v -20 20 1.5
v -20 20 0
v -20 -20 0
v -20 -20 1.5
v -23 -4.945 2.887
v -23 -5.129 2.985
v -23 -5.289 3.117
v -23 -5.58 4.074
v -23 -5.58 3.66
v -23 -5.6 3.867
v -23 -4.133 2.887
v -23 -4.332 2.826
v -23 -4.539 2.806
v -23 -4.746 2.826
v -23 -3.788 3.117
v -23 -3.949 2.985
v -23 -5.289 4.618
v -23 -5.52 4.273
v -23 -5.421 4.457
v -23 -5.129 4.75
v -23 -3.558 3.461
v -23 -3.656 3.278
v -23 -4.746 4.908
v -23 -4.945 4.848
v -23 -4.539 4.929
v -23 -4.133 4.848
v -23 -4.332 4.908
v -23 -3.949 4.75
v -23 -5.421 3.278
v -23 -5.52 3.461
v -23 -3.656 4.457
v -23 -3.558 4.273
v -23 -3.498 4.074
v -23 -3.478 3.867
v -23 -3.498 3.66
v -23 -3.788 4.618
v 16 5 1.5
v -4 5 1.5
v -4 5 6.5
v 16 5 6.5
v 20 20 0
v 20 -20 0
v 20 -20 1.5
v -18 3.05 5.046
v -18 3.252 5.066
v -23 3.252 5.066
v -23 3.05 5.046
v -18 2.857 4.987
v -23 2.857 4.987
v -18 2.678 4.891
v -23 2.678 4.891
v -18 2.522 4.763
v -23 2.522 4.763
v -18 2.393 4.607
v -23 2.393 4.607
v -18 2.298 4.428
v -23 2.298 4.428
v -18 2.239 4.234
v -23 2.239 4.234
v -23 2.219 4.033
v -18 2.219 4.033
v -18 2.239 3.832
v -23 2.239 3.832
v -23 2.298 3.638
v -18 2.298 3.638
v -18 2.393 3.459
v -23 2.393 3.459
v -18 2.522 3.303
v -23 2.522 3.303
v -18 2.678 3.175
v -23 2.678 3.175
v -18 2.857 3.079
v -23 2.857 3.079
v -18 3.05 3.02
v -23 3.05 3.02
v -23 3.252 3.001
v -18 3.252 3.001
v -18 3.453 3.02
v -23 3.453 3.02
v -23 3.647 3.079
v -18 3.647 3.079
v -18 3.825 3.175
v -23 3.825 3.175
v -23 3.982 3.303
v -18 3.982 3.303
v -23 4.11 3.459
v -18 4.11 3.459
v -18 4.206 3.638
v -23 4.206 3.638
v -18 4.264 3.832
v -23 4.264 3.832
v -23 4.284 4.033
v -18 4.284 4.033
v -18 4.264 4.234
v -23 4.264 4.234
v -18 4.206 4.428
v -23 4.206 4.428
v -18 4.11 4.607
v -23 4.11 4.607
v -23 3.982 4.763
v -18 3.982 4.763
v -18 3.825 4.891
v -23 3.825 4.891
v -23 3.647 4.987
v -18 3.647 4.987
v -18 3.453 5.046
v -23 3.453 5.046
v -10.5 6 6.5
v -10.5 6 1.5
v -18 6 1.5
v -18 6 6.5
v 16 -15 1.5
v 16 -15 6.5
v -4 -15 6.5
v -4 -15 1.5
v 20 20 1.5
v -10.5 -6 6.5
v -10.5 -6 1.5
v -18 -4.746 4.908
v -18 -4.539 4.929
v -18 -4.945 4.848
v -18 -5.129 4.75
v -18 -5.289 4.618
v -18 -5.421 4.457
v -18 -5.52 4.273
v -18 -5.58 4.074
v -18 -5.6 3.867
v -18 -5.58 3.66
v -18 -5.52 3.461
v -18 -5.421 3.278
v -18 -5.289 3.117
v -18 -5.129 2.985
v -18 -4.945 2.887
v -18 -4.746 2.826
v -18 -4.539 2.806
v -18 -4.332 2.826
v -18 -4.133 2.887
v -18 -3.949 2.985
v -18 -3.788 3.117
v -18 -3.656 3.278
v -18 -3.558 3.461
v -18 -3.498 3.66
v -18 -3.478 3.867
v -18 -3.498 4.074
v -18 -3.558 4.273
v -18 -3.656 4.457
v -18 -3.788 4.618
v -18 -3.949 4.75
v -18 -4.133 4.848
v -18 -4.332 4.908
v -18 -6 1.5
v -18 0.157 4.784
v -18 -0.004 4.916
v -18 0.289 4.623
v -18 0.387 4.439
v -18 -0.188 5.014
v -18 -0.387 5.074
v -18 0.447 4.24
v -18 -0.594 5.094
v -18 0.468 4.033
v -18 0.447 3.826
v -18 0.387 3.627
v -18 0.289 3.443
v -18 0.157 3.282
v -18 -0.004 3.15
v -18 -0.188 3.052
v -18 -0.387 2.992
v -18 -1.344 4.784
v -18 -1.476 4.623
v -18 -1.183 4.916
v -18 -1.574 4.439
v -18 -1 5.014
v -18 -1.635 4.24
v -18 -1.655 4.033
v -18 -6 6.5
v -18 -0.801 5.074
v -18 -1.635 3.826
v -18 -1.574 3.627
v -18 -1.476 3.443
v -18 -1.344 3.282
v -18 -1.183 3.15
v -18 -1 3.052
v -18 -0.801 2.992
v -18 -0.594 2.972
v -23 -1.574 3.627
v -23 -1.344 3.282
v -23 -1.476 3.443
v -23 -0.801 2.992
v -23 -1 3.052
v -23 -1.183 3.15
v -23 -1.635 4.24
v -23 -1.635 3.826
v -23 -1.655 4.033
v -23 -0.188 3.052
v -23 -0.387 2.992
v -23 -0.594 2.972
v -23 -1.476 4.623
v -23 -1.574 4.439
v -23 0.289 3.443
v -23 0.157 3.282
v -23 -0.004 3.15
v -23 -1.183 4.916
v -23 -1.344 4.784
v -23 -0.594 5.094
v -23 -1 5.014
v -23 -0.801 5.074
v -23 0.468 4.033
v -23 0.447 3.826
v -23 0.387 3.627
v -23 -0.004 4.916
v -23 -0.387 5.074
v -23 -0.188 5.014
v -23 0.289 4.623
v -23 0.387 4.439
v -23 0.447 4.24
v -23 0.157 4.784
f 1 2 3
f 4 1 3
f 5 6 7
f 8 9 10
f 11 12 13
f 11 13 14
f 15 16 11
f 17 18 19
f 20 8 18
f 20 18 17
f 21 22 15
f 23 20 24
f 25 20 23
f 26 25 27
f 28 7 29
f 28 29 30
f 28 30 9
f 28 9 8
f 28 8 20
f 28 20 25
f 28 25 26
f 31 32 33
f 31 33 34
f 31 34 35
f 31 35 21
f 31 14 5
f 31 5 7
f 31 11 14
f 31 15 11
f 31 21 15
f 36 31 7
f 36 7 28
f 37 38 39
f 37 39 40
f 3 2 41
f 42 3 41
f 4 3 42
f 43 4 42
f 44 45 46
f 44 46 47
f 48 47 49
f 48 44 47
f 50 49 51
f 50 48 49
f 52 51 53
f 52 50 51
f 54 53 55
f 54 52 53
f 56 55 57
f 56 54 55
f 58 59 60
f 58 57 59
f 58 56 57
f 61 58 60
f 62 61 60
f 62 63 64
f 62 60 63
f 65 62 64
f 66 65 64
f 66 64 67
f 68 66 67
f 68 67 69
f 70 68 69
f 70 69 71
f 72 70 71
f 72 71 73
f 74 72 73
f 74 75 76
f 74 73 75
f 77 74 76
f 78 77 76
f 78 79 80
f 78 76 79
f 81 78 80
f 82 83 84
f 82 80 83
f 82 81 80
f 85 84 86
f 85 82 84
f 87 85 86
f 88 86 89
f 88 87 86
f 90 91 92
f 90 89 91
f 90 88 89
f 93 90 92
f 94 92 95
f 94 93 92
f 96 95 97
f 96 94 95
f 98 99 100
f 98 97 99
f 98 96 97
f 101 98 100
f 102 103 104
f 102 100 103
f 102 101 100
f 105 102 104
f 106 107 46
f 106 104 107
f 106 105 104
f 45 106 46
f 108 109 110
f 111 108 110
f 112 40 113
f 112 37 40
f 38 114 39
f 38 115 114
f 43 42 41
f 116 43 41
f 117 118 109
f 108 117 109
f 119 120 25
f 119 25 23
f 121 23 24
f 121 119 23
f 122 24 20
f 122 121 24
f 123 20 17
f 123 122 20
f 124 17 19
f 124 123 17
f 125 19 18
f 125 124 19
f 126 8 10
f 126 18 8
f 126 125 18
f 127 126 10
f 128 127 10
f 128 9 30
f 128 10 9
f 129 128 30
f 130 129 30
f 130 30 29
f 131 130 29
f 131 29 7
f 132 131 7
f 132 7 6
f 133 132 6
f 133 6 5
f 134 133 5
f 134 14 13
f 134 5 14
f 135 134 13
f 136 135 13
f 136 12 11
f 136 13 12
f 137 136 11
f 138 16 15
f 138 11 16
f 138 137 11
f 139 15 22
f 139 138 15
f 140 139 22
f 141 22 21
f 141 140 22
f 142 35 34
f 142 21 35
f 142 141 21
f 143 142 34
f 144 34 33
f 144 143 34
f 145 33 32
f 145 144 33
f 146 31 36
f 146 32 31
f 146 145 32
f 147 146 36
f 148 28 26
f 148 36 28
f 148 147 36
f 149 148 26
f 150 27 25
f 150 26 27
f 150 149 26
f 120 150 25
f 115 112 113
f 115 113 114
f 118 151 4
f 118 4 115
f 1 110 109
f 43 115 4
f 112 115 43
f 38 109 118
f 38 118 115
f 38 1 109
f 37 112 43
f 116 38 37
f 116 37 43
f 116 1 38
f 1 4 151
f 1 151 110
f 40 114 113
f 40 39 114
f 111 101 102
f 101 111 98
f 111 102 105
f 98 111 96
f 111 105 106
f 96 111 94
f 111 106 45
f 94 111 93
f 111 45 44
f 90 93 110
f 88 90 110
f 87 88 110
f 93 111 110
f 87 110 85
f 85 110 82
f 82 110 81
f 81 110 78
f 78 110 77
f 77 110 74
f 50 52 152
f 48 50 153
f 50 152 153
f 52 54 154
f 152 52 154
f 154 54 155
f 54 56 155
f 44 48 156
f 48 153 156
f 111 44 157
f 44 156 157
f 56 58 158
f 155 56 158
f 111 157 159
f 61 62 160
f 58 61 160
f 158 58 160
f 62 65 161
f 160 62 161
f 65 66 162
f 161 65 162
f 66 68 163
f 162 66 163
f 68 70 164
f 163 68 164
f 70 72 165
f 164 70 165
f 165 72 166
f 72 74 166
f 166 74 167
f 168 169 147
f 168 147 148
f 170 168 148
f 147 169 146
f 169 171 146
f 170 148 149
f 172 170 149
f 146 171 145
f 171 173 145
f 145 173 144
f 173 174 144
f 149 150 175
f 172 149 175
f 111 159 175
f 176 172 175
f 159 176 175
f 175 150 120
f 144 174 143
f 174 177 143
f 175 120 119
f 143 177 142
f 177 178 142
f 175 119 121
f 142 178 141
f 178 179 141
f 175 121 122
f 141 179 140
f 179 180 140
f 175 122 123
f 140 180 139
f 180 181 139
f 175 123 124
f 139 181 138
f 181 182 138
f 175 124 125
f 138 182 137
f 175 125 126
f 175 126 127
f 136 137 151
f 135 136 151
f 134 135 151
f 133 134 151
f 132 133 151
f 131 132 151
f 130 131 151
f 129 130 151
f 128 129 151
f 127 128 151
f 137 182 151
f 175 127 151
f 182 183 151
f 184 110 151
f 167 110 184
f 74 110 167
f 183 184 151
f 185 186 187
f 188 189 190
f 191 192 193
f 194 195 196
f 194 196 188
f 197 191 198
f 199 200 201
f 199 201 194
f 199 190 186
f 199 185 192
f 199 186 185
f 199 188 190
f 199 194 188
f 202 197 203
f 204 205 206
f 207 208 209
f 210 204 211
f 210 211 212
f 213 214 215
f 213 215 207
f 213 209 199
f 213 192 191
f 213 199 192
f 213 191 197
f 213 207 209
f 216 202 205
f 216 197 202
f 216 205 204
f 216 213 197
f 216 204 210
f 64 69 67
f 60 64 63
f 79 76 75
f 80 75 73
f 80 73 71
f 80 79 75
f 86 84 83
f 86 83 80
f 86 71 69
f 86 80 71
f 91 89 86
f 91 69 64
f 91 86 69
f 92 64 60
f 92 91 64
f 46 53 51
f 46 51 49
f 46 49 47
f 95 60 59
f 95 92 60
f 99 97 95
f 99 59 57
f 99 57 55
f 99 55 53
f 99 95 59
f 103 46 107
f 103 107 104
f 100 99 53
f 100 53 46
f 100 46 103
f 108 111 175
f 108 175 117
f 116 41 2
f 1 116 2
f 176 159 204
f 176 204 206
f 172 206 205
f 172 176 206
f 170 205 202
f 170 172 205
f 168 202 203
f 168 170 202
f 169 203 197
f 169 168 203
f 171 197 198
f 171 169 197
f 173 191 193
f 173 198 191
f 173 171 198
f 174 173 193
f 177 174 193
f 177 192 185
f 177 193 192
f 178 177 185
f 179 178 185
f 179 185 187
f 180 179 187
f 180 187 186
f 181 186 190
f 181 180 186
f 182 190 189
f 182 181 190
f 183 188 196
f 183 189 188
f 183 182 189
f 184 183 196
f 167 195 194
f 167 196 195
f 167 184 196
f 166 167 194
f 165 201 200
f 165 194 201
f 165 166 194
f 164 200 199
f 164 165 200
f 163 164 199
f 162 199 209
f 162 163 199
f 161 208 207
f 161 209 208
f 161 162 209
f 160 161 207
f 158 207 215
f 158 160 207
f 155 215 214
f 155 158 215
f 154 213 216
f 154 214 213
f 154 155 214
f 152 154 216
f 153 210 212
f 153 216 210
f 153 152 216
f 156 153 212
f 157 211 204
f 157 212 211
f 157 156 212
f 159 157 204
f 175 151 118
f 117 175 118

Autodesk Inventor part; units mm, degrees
ref_plane "YZ Plane" through (0, 0, 0) normal (1, 0, 0) x (0, 1, 0)
ref_plane "XZ Plane" through (0, 0, 0) normal (0, 1, 0) x (-1, 0, 0)
ref_plane "XY Plane" through (0, 0, 0) normal (0, 0, 1) x (1, 0, 0)
sketch "Sketch1" plane through (0, 0, 0) normal (0, 0, 1) x (1, 0, 0)
  line L0 (-20, -20) -> (20, -20)
  line L1 (20, -20) -> (20, 20)
  line L2 (20, 20) -> (-20, 20)
  line L3 (-20, 20) -> (-20, -20)
  line L4 (-20, -20) -> (20, 20) construction
  line L5 (20, -20) -> (-20, 20) construction
  point P0 (0, 0)
  dimension "d0" = 40
  dimension "d1" = 40
extrude "Extrusion1" add sketch "Sketch1" along normal blind 1.5
sketch "Sketch2" plane through (0, 0, 1.5) normal (0, 0, 1) x (1, 0, 0)
  line L0 (-28, 0) -> (28, 0) projected
  line L1 (-18, -6) -> (-10.5, -6)
  line L2 (-10.5, -6) -> (-10.5, 6)
  line L3 (-10.5, 6) -> (-18, 6)
  line L4 (-18, 6) -> (-18, -6)
  line L5 (-18, -6) -> (-10.5, 6) construction
  line L6 (-10.5, -6) -> (-18, 6) construction
  line L7 (-20, 20) -> (-20, -20) projected
  point P0 (0, 0)
  point P1 (-14.25, 0)
  dimension "d4" = 7.5
  dimension "d5" = 12
  dimension "d6" = 2
extrude "Extrusion2" add sketch "Sketch2" along normal blind 5
sketch "Sketch3" plane through (0, 0, 1.5) normal (0, 0, 1) x (1, 0, 0)
  line L0 (16, -15) -> (-4, -15)
  line L1 (-4, -15) -> (-4, 5)
  line L2 (-4, 5) -> (16, 5)
  line L3 (16, 5) -> (16, -15)
  line L4 (20, -20) -> (20, 20) projected
  line L5 (-20, -20) -> (20, -20) projected
  point P0 (0, 0)
  dimension "d9" = 4
  dimension "d10" = 5
  dimension "d11" = 20
  dimension "d12" = 20
extrude "Extrusion3" add sketch "Sketch3" along normal blind 5
sketch "Sketch4" plane through (-18, -6, 1.5) normal (-1, 0, 0) x (0, 0, 1)
  circle A0 centre (2.533, 9.2518) radius 1.0325
  circle A1 centre (2.533, 5.4062) radius 1.0614
  circle A2 centre (2.3673, 1.4611) radius 1.0614
  point P0 (-1.5, 6)
extrude "Extrusion4" add sketch "Sketch4" along normal blind 5
properties part number "oledlcd"
